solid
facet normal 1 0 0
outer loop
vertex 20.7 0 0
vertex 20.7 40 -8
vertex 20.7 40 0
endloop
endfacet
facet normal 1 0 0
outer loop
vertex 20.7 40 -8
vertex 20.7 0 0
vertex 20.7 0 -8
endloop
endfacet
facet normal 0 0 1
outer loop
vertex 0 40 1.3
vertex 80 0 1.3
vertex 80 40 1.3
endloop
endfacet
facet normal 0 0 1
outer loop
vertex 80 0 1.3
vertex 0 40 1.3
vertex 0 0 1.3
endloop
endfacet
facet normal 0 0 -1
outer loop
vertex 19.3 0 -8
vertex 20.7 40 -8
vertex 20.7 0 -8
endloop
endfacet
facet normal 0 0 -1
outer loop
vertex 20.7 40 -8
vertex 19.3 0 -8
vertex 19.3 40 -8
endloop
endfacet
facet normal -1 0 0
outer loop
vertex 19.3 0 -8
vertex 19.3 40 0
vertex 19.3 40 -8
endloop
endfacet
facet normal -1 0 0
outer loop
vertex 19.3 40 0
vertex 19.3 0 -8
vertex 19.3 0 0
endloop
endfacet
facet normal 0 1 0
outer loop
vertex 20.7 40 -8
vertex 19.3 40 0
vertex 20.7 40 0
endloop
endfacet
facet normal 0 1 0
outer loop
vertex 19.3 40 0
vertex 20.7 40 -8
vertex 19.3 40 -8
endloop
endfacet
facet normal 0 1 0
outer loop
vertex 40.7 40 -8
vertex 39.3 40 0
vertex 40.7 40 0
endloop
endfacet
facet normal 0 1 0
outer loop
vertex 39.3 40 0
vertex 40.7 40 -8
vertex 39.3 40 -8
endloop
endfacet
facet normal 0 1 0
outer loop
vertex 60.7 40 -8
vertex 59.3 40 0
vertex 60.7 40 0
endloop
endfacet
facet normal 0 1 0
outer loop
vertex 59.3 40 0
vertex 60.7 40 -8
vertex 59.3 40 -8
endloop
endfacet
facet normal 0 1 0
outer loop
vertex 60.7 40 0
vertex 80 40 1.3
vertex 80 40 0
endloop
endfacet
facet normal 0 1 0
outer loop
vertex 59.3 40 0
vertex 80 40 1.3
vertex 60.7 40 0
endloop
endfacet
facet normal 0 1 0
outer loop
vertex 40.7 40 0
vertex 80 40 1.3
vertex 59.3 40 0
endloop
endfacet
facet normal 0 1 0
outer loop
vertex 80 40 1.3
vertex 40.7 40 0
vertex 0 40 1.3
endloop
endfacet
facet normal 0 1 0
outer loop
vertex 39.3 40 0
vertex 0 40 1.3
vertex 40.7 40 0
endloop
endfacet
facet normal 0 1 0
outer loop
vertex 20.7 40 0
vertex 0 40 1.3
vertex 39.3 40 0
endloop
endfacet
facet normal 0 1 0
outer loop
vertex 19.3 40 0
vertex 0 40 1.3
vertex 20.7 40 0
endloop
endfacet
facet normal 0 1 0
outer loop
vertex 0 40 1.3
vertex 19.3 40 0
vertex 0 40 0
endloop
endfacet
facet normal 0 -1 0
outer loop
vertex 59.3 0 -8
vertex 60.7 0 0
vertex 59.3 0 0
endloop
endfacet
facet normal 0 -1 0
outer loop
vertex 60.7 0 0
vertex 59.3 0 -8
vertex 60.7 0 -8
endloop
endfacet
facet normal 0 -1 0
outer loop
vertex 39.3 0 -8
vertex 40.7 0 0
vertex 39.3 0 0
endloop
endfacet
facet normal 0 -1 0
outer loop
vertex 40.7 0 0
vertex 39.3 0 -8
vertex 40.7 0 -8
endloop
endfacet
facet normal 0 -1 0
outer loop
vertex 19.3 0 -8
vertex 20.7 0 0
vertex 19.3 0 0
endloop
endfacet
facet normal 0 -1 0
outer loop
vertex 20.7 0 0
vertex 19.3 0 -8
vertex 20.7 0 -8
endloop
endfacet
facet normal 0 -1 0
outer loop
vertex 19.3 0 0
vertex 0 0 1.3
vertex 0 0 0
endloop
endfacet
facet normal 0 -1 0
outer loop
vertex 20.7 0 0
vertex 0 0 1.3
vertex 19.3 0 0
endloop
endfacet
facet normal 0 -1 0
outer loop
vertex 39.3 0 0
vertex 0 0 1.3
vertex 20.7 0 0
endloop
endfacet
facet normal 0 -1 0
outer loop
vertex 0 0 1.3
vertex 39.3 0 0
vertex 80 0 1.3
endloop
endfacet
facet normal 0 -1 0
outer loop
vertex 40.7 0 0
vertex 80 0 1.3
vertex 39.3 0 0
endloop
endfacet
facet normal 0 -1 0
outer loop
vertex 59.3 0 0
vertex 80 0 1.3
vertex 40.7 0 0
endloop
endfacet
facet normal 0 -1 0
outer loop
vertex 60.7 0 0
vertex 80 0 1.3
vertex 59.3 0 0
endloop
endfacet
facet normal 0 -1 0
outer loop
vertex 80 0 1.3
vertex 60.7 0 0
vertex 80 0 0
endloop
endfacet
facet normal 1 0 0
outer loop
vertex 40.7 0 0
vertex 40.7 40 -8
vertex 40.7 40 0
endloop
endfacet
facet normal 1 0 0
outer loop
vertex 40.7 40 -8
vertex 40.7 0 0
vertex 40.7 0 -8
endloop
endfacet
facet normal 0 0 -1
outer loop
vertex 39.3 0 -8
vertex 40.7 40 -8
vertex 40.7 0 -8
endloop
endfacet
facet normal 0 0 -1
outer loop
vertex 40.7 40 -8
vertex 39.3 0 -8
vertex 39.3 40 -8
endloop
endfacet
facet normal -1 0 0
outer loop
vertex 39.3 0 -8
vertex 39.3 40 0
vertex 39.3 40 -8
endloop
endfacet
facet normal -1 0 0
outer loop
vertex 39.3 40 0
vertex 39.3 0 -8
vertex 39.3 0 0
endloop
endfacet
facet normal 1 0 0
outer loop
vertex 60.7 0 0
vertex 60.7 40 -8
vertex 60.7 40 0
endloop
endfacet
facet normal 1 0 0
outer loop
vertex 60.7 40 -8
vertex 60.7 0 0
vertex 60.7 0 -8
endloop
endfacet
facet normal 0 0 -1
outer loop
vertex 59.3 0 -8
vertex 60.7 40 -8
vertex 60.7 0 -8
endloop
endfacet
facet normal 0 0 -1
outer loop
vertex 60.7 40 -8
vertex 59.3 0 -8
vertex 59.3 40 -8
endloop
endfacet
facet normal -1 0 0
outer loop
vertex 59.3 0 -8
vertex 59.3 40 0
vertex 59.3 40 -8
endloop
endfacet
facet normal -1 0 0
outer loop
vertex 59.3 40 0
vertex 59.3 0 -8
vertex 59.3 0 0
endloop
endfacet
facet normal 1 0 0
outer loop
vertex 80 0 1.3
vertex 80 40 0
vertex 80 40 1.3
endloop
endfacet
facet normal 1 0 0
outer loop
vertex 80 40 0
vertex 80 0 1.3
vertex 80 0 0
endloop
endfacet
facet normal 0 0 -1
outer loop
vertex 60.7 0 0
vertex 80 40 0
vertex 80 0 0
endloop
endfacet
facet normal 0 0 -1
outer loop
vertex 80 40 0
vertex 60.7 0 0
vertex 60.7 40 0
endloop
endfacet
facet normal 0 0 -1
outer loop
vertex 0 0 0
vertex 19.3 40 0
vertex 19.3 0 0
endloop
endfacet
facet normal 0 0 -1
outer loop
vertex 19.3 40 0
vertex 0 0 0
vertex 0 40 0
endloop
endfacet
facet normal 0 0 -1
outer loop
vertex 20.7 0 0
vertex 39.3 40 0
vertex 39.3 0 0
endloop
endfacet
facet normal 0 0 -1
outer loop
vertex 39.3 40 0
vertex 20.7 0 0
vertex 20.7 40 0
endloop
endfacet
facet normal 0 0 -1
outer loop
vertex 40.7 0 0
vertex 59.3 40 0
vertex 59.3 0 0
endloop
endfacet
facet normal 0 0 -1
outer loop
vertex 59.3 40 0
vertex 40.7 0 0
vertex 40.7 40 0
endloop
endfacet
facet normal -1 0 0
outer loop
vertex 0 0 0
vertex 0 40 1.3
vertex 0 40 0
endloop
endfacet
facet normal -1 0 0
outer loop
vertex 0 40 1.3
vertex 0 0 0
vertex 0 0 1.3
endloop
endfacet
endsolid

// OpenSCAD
$fn = 32;

// ----------------------------------------------------------------------
// Ribbed panel: 1.3 mm panel
// ----------------------------------------------------------------------

// --- parameters (mm) ---
panel_l = 80;             // panel length, X
panel_w = 40;             // panel width, Y
panel_t = 1.3;            // panel thickness, Z
rib_t = 1.4;              // rib thickness
rib_h = 8;                // rib height below the panel
ribs = 3;                 // number of ribs

total_h = panel_t + rib_h;  // overall height

union() {
  cube([panel_l, panel_w, panel_t]);
  for (i = [1 : ribs])
    translate([i * panel_l / (ribs + 1) - rib_t / 2, 0, -rib_h])
      cube([rib_t, panel_w, rib_h + panel_t]);
}
